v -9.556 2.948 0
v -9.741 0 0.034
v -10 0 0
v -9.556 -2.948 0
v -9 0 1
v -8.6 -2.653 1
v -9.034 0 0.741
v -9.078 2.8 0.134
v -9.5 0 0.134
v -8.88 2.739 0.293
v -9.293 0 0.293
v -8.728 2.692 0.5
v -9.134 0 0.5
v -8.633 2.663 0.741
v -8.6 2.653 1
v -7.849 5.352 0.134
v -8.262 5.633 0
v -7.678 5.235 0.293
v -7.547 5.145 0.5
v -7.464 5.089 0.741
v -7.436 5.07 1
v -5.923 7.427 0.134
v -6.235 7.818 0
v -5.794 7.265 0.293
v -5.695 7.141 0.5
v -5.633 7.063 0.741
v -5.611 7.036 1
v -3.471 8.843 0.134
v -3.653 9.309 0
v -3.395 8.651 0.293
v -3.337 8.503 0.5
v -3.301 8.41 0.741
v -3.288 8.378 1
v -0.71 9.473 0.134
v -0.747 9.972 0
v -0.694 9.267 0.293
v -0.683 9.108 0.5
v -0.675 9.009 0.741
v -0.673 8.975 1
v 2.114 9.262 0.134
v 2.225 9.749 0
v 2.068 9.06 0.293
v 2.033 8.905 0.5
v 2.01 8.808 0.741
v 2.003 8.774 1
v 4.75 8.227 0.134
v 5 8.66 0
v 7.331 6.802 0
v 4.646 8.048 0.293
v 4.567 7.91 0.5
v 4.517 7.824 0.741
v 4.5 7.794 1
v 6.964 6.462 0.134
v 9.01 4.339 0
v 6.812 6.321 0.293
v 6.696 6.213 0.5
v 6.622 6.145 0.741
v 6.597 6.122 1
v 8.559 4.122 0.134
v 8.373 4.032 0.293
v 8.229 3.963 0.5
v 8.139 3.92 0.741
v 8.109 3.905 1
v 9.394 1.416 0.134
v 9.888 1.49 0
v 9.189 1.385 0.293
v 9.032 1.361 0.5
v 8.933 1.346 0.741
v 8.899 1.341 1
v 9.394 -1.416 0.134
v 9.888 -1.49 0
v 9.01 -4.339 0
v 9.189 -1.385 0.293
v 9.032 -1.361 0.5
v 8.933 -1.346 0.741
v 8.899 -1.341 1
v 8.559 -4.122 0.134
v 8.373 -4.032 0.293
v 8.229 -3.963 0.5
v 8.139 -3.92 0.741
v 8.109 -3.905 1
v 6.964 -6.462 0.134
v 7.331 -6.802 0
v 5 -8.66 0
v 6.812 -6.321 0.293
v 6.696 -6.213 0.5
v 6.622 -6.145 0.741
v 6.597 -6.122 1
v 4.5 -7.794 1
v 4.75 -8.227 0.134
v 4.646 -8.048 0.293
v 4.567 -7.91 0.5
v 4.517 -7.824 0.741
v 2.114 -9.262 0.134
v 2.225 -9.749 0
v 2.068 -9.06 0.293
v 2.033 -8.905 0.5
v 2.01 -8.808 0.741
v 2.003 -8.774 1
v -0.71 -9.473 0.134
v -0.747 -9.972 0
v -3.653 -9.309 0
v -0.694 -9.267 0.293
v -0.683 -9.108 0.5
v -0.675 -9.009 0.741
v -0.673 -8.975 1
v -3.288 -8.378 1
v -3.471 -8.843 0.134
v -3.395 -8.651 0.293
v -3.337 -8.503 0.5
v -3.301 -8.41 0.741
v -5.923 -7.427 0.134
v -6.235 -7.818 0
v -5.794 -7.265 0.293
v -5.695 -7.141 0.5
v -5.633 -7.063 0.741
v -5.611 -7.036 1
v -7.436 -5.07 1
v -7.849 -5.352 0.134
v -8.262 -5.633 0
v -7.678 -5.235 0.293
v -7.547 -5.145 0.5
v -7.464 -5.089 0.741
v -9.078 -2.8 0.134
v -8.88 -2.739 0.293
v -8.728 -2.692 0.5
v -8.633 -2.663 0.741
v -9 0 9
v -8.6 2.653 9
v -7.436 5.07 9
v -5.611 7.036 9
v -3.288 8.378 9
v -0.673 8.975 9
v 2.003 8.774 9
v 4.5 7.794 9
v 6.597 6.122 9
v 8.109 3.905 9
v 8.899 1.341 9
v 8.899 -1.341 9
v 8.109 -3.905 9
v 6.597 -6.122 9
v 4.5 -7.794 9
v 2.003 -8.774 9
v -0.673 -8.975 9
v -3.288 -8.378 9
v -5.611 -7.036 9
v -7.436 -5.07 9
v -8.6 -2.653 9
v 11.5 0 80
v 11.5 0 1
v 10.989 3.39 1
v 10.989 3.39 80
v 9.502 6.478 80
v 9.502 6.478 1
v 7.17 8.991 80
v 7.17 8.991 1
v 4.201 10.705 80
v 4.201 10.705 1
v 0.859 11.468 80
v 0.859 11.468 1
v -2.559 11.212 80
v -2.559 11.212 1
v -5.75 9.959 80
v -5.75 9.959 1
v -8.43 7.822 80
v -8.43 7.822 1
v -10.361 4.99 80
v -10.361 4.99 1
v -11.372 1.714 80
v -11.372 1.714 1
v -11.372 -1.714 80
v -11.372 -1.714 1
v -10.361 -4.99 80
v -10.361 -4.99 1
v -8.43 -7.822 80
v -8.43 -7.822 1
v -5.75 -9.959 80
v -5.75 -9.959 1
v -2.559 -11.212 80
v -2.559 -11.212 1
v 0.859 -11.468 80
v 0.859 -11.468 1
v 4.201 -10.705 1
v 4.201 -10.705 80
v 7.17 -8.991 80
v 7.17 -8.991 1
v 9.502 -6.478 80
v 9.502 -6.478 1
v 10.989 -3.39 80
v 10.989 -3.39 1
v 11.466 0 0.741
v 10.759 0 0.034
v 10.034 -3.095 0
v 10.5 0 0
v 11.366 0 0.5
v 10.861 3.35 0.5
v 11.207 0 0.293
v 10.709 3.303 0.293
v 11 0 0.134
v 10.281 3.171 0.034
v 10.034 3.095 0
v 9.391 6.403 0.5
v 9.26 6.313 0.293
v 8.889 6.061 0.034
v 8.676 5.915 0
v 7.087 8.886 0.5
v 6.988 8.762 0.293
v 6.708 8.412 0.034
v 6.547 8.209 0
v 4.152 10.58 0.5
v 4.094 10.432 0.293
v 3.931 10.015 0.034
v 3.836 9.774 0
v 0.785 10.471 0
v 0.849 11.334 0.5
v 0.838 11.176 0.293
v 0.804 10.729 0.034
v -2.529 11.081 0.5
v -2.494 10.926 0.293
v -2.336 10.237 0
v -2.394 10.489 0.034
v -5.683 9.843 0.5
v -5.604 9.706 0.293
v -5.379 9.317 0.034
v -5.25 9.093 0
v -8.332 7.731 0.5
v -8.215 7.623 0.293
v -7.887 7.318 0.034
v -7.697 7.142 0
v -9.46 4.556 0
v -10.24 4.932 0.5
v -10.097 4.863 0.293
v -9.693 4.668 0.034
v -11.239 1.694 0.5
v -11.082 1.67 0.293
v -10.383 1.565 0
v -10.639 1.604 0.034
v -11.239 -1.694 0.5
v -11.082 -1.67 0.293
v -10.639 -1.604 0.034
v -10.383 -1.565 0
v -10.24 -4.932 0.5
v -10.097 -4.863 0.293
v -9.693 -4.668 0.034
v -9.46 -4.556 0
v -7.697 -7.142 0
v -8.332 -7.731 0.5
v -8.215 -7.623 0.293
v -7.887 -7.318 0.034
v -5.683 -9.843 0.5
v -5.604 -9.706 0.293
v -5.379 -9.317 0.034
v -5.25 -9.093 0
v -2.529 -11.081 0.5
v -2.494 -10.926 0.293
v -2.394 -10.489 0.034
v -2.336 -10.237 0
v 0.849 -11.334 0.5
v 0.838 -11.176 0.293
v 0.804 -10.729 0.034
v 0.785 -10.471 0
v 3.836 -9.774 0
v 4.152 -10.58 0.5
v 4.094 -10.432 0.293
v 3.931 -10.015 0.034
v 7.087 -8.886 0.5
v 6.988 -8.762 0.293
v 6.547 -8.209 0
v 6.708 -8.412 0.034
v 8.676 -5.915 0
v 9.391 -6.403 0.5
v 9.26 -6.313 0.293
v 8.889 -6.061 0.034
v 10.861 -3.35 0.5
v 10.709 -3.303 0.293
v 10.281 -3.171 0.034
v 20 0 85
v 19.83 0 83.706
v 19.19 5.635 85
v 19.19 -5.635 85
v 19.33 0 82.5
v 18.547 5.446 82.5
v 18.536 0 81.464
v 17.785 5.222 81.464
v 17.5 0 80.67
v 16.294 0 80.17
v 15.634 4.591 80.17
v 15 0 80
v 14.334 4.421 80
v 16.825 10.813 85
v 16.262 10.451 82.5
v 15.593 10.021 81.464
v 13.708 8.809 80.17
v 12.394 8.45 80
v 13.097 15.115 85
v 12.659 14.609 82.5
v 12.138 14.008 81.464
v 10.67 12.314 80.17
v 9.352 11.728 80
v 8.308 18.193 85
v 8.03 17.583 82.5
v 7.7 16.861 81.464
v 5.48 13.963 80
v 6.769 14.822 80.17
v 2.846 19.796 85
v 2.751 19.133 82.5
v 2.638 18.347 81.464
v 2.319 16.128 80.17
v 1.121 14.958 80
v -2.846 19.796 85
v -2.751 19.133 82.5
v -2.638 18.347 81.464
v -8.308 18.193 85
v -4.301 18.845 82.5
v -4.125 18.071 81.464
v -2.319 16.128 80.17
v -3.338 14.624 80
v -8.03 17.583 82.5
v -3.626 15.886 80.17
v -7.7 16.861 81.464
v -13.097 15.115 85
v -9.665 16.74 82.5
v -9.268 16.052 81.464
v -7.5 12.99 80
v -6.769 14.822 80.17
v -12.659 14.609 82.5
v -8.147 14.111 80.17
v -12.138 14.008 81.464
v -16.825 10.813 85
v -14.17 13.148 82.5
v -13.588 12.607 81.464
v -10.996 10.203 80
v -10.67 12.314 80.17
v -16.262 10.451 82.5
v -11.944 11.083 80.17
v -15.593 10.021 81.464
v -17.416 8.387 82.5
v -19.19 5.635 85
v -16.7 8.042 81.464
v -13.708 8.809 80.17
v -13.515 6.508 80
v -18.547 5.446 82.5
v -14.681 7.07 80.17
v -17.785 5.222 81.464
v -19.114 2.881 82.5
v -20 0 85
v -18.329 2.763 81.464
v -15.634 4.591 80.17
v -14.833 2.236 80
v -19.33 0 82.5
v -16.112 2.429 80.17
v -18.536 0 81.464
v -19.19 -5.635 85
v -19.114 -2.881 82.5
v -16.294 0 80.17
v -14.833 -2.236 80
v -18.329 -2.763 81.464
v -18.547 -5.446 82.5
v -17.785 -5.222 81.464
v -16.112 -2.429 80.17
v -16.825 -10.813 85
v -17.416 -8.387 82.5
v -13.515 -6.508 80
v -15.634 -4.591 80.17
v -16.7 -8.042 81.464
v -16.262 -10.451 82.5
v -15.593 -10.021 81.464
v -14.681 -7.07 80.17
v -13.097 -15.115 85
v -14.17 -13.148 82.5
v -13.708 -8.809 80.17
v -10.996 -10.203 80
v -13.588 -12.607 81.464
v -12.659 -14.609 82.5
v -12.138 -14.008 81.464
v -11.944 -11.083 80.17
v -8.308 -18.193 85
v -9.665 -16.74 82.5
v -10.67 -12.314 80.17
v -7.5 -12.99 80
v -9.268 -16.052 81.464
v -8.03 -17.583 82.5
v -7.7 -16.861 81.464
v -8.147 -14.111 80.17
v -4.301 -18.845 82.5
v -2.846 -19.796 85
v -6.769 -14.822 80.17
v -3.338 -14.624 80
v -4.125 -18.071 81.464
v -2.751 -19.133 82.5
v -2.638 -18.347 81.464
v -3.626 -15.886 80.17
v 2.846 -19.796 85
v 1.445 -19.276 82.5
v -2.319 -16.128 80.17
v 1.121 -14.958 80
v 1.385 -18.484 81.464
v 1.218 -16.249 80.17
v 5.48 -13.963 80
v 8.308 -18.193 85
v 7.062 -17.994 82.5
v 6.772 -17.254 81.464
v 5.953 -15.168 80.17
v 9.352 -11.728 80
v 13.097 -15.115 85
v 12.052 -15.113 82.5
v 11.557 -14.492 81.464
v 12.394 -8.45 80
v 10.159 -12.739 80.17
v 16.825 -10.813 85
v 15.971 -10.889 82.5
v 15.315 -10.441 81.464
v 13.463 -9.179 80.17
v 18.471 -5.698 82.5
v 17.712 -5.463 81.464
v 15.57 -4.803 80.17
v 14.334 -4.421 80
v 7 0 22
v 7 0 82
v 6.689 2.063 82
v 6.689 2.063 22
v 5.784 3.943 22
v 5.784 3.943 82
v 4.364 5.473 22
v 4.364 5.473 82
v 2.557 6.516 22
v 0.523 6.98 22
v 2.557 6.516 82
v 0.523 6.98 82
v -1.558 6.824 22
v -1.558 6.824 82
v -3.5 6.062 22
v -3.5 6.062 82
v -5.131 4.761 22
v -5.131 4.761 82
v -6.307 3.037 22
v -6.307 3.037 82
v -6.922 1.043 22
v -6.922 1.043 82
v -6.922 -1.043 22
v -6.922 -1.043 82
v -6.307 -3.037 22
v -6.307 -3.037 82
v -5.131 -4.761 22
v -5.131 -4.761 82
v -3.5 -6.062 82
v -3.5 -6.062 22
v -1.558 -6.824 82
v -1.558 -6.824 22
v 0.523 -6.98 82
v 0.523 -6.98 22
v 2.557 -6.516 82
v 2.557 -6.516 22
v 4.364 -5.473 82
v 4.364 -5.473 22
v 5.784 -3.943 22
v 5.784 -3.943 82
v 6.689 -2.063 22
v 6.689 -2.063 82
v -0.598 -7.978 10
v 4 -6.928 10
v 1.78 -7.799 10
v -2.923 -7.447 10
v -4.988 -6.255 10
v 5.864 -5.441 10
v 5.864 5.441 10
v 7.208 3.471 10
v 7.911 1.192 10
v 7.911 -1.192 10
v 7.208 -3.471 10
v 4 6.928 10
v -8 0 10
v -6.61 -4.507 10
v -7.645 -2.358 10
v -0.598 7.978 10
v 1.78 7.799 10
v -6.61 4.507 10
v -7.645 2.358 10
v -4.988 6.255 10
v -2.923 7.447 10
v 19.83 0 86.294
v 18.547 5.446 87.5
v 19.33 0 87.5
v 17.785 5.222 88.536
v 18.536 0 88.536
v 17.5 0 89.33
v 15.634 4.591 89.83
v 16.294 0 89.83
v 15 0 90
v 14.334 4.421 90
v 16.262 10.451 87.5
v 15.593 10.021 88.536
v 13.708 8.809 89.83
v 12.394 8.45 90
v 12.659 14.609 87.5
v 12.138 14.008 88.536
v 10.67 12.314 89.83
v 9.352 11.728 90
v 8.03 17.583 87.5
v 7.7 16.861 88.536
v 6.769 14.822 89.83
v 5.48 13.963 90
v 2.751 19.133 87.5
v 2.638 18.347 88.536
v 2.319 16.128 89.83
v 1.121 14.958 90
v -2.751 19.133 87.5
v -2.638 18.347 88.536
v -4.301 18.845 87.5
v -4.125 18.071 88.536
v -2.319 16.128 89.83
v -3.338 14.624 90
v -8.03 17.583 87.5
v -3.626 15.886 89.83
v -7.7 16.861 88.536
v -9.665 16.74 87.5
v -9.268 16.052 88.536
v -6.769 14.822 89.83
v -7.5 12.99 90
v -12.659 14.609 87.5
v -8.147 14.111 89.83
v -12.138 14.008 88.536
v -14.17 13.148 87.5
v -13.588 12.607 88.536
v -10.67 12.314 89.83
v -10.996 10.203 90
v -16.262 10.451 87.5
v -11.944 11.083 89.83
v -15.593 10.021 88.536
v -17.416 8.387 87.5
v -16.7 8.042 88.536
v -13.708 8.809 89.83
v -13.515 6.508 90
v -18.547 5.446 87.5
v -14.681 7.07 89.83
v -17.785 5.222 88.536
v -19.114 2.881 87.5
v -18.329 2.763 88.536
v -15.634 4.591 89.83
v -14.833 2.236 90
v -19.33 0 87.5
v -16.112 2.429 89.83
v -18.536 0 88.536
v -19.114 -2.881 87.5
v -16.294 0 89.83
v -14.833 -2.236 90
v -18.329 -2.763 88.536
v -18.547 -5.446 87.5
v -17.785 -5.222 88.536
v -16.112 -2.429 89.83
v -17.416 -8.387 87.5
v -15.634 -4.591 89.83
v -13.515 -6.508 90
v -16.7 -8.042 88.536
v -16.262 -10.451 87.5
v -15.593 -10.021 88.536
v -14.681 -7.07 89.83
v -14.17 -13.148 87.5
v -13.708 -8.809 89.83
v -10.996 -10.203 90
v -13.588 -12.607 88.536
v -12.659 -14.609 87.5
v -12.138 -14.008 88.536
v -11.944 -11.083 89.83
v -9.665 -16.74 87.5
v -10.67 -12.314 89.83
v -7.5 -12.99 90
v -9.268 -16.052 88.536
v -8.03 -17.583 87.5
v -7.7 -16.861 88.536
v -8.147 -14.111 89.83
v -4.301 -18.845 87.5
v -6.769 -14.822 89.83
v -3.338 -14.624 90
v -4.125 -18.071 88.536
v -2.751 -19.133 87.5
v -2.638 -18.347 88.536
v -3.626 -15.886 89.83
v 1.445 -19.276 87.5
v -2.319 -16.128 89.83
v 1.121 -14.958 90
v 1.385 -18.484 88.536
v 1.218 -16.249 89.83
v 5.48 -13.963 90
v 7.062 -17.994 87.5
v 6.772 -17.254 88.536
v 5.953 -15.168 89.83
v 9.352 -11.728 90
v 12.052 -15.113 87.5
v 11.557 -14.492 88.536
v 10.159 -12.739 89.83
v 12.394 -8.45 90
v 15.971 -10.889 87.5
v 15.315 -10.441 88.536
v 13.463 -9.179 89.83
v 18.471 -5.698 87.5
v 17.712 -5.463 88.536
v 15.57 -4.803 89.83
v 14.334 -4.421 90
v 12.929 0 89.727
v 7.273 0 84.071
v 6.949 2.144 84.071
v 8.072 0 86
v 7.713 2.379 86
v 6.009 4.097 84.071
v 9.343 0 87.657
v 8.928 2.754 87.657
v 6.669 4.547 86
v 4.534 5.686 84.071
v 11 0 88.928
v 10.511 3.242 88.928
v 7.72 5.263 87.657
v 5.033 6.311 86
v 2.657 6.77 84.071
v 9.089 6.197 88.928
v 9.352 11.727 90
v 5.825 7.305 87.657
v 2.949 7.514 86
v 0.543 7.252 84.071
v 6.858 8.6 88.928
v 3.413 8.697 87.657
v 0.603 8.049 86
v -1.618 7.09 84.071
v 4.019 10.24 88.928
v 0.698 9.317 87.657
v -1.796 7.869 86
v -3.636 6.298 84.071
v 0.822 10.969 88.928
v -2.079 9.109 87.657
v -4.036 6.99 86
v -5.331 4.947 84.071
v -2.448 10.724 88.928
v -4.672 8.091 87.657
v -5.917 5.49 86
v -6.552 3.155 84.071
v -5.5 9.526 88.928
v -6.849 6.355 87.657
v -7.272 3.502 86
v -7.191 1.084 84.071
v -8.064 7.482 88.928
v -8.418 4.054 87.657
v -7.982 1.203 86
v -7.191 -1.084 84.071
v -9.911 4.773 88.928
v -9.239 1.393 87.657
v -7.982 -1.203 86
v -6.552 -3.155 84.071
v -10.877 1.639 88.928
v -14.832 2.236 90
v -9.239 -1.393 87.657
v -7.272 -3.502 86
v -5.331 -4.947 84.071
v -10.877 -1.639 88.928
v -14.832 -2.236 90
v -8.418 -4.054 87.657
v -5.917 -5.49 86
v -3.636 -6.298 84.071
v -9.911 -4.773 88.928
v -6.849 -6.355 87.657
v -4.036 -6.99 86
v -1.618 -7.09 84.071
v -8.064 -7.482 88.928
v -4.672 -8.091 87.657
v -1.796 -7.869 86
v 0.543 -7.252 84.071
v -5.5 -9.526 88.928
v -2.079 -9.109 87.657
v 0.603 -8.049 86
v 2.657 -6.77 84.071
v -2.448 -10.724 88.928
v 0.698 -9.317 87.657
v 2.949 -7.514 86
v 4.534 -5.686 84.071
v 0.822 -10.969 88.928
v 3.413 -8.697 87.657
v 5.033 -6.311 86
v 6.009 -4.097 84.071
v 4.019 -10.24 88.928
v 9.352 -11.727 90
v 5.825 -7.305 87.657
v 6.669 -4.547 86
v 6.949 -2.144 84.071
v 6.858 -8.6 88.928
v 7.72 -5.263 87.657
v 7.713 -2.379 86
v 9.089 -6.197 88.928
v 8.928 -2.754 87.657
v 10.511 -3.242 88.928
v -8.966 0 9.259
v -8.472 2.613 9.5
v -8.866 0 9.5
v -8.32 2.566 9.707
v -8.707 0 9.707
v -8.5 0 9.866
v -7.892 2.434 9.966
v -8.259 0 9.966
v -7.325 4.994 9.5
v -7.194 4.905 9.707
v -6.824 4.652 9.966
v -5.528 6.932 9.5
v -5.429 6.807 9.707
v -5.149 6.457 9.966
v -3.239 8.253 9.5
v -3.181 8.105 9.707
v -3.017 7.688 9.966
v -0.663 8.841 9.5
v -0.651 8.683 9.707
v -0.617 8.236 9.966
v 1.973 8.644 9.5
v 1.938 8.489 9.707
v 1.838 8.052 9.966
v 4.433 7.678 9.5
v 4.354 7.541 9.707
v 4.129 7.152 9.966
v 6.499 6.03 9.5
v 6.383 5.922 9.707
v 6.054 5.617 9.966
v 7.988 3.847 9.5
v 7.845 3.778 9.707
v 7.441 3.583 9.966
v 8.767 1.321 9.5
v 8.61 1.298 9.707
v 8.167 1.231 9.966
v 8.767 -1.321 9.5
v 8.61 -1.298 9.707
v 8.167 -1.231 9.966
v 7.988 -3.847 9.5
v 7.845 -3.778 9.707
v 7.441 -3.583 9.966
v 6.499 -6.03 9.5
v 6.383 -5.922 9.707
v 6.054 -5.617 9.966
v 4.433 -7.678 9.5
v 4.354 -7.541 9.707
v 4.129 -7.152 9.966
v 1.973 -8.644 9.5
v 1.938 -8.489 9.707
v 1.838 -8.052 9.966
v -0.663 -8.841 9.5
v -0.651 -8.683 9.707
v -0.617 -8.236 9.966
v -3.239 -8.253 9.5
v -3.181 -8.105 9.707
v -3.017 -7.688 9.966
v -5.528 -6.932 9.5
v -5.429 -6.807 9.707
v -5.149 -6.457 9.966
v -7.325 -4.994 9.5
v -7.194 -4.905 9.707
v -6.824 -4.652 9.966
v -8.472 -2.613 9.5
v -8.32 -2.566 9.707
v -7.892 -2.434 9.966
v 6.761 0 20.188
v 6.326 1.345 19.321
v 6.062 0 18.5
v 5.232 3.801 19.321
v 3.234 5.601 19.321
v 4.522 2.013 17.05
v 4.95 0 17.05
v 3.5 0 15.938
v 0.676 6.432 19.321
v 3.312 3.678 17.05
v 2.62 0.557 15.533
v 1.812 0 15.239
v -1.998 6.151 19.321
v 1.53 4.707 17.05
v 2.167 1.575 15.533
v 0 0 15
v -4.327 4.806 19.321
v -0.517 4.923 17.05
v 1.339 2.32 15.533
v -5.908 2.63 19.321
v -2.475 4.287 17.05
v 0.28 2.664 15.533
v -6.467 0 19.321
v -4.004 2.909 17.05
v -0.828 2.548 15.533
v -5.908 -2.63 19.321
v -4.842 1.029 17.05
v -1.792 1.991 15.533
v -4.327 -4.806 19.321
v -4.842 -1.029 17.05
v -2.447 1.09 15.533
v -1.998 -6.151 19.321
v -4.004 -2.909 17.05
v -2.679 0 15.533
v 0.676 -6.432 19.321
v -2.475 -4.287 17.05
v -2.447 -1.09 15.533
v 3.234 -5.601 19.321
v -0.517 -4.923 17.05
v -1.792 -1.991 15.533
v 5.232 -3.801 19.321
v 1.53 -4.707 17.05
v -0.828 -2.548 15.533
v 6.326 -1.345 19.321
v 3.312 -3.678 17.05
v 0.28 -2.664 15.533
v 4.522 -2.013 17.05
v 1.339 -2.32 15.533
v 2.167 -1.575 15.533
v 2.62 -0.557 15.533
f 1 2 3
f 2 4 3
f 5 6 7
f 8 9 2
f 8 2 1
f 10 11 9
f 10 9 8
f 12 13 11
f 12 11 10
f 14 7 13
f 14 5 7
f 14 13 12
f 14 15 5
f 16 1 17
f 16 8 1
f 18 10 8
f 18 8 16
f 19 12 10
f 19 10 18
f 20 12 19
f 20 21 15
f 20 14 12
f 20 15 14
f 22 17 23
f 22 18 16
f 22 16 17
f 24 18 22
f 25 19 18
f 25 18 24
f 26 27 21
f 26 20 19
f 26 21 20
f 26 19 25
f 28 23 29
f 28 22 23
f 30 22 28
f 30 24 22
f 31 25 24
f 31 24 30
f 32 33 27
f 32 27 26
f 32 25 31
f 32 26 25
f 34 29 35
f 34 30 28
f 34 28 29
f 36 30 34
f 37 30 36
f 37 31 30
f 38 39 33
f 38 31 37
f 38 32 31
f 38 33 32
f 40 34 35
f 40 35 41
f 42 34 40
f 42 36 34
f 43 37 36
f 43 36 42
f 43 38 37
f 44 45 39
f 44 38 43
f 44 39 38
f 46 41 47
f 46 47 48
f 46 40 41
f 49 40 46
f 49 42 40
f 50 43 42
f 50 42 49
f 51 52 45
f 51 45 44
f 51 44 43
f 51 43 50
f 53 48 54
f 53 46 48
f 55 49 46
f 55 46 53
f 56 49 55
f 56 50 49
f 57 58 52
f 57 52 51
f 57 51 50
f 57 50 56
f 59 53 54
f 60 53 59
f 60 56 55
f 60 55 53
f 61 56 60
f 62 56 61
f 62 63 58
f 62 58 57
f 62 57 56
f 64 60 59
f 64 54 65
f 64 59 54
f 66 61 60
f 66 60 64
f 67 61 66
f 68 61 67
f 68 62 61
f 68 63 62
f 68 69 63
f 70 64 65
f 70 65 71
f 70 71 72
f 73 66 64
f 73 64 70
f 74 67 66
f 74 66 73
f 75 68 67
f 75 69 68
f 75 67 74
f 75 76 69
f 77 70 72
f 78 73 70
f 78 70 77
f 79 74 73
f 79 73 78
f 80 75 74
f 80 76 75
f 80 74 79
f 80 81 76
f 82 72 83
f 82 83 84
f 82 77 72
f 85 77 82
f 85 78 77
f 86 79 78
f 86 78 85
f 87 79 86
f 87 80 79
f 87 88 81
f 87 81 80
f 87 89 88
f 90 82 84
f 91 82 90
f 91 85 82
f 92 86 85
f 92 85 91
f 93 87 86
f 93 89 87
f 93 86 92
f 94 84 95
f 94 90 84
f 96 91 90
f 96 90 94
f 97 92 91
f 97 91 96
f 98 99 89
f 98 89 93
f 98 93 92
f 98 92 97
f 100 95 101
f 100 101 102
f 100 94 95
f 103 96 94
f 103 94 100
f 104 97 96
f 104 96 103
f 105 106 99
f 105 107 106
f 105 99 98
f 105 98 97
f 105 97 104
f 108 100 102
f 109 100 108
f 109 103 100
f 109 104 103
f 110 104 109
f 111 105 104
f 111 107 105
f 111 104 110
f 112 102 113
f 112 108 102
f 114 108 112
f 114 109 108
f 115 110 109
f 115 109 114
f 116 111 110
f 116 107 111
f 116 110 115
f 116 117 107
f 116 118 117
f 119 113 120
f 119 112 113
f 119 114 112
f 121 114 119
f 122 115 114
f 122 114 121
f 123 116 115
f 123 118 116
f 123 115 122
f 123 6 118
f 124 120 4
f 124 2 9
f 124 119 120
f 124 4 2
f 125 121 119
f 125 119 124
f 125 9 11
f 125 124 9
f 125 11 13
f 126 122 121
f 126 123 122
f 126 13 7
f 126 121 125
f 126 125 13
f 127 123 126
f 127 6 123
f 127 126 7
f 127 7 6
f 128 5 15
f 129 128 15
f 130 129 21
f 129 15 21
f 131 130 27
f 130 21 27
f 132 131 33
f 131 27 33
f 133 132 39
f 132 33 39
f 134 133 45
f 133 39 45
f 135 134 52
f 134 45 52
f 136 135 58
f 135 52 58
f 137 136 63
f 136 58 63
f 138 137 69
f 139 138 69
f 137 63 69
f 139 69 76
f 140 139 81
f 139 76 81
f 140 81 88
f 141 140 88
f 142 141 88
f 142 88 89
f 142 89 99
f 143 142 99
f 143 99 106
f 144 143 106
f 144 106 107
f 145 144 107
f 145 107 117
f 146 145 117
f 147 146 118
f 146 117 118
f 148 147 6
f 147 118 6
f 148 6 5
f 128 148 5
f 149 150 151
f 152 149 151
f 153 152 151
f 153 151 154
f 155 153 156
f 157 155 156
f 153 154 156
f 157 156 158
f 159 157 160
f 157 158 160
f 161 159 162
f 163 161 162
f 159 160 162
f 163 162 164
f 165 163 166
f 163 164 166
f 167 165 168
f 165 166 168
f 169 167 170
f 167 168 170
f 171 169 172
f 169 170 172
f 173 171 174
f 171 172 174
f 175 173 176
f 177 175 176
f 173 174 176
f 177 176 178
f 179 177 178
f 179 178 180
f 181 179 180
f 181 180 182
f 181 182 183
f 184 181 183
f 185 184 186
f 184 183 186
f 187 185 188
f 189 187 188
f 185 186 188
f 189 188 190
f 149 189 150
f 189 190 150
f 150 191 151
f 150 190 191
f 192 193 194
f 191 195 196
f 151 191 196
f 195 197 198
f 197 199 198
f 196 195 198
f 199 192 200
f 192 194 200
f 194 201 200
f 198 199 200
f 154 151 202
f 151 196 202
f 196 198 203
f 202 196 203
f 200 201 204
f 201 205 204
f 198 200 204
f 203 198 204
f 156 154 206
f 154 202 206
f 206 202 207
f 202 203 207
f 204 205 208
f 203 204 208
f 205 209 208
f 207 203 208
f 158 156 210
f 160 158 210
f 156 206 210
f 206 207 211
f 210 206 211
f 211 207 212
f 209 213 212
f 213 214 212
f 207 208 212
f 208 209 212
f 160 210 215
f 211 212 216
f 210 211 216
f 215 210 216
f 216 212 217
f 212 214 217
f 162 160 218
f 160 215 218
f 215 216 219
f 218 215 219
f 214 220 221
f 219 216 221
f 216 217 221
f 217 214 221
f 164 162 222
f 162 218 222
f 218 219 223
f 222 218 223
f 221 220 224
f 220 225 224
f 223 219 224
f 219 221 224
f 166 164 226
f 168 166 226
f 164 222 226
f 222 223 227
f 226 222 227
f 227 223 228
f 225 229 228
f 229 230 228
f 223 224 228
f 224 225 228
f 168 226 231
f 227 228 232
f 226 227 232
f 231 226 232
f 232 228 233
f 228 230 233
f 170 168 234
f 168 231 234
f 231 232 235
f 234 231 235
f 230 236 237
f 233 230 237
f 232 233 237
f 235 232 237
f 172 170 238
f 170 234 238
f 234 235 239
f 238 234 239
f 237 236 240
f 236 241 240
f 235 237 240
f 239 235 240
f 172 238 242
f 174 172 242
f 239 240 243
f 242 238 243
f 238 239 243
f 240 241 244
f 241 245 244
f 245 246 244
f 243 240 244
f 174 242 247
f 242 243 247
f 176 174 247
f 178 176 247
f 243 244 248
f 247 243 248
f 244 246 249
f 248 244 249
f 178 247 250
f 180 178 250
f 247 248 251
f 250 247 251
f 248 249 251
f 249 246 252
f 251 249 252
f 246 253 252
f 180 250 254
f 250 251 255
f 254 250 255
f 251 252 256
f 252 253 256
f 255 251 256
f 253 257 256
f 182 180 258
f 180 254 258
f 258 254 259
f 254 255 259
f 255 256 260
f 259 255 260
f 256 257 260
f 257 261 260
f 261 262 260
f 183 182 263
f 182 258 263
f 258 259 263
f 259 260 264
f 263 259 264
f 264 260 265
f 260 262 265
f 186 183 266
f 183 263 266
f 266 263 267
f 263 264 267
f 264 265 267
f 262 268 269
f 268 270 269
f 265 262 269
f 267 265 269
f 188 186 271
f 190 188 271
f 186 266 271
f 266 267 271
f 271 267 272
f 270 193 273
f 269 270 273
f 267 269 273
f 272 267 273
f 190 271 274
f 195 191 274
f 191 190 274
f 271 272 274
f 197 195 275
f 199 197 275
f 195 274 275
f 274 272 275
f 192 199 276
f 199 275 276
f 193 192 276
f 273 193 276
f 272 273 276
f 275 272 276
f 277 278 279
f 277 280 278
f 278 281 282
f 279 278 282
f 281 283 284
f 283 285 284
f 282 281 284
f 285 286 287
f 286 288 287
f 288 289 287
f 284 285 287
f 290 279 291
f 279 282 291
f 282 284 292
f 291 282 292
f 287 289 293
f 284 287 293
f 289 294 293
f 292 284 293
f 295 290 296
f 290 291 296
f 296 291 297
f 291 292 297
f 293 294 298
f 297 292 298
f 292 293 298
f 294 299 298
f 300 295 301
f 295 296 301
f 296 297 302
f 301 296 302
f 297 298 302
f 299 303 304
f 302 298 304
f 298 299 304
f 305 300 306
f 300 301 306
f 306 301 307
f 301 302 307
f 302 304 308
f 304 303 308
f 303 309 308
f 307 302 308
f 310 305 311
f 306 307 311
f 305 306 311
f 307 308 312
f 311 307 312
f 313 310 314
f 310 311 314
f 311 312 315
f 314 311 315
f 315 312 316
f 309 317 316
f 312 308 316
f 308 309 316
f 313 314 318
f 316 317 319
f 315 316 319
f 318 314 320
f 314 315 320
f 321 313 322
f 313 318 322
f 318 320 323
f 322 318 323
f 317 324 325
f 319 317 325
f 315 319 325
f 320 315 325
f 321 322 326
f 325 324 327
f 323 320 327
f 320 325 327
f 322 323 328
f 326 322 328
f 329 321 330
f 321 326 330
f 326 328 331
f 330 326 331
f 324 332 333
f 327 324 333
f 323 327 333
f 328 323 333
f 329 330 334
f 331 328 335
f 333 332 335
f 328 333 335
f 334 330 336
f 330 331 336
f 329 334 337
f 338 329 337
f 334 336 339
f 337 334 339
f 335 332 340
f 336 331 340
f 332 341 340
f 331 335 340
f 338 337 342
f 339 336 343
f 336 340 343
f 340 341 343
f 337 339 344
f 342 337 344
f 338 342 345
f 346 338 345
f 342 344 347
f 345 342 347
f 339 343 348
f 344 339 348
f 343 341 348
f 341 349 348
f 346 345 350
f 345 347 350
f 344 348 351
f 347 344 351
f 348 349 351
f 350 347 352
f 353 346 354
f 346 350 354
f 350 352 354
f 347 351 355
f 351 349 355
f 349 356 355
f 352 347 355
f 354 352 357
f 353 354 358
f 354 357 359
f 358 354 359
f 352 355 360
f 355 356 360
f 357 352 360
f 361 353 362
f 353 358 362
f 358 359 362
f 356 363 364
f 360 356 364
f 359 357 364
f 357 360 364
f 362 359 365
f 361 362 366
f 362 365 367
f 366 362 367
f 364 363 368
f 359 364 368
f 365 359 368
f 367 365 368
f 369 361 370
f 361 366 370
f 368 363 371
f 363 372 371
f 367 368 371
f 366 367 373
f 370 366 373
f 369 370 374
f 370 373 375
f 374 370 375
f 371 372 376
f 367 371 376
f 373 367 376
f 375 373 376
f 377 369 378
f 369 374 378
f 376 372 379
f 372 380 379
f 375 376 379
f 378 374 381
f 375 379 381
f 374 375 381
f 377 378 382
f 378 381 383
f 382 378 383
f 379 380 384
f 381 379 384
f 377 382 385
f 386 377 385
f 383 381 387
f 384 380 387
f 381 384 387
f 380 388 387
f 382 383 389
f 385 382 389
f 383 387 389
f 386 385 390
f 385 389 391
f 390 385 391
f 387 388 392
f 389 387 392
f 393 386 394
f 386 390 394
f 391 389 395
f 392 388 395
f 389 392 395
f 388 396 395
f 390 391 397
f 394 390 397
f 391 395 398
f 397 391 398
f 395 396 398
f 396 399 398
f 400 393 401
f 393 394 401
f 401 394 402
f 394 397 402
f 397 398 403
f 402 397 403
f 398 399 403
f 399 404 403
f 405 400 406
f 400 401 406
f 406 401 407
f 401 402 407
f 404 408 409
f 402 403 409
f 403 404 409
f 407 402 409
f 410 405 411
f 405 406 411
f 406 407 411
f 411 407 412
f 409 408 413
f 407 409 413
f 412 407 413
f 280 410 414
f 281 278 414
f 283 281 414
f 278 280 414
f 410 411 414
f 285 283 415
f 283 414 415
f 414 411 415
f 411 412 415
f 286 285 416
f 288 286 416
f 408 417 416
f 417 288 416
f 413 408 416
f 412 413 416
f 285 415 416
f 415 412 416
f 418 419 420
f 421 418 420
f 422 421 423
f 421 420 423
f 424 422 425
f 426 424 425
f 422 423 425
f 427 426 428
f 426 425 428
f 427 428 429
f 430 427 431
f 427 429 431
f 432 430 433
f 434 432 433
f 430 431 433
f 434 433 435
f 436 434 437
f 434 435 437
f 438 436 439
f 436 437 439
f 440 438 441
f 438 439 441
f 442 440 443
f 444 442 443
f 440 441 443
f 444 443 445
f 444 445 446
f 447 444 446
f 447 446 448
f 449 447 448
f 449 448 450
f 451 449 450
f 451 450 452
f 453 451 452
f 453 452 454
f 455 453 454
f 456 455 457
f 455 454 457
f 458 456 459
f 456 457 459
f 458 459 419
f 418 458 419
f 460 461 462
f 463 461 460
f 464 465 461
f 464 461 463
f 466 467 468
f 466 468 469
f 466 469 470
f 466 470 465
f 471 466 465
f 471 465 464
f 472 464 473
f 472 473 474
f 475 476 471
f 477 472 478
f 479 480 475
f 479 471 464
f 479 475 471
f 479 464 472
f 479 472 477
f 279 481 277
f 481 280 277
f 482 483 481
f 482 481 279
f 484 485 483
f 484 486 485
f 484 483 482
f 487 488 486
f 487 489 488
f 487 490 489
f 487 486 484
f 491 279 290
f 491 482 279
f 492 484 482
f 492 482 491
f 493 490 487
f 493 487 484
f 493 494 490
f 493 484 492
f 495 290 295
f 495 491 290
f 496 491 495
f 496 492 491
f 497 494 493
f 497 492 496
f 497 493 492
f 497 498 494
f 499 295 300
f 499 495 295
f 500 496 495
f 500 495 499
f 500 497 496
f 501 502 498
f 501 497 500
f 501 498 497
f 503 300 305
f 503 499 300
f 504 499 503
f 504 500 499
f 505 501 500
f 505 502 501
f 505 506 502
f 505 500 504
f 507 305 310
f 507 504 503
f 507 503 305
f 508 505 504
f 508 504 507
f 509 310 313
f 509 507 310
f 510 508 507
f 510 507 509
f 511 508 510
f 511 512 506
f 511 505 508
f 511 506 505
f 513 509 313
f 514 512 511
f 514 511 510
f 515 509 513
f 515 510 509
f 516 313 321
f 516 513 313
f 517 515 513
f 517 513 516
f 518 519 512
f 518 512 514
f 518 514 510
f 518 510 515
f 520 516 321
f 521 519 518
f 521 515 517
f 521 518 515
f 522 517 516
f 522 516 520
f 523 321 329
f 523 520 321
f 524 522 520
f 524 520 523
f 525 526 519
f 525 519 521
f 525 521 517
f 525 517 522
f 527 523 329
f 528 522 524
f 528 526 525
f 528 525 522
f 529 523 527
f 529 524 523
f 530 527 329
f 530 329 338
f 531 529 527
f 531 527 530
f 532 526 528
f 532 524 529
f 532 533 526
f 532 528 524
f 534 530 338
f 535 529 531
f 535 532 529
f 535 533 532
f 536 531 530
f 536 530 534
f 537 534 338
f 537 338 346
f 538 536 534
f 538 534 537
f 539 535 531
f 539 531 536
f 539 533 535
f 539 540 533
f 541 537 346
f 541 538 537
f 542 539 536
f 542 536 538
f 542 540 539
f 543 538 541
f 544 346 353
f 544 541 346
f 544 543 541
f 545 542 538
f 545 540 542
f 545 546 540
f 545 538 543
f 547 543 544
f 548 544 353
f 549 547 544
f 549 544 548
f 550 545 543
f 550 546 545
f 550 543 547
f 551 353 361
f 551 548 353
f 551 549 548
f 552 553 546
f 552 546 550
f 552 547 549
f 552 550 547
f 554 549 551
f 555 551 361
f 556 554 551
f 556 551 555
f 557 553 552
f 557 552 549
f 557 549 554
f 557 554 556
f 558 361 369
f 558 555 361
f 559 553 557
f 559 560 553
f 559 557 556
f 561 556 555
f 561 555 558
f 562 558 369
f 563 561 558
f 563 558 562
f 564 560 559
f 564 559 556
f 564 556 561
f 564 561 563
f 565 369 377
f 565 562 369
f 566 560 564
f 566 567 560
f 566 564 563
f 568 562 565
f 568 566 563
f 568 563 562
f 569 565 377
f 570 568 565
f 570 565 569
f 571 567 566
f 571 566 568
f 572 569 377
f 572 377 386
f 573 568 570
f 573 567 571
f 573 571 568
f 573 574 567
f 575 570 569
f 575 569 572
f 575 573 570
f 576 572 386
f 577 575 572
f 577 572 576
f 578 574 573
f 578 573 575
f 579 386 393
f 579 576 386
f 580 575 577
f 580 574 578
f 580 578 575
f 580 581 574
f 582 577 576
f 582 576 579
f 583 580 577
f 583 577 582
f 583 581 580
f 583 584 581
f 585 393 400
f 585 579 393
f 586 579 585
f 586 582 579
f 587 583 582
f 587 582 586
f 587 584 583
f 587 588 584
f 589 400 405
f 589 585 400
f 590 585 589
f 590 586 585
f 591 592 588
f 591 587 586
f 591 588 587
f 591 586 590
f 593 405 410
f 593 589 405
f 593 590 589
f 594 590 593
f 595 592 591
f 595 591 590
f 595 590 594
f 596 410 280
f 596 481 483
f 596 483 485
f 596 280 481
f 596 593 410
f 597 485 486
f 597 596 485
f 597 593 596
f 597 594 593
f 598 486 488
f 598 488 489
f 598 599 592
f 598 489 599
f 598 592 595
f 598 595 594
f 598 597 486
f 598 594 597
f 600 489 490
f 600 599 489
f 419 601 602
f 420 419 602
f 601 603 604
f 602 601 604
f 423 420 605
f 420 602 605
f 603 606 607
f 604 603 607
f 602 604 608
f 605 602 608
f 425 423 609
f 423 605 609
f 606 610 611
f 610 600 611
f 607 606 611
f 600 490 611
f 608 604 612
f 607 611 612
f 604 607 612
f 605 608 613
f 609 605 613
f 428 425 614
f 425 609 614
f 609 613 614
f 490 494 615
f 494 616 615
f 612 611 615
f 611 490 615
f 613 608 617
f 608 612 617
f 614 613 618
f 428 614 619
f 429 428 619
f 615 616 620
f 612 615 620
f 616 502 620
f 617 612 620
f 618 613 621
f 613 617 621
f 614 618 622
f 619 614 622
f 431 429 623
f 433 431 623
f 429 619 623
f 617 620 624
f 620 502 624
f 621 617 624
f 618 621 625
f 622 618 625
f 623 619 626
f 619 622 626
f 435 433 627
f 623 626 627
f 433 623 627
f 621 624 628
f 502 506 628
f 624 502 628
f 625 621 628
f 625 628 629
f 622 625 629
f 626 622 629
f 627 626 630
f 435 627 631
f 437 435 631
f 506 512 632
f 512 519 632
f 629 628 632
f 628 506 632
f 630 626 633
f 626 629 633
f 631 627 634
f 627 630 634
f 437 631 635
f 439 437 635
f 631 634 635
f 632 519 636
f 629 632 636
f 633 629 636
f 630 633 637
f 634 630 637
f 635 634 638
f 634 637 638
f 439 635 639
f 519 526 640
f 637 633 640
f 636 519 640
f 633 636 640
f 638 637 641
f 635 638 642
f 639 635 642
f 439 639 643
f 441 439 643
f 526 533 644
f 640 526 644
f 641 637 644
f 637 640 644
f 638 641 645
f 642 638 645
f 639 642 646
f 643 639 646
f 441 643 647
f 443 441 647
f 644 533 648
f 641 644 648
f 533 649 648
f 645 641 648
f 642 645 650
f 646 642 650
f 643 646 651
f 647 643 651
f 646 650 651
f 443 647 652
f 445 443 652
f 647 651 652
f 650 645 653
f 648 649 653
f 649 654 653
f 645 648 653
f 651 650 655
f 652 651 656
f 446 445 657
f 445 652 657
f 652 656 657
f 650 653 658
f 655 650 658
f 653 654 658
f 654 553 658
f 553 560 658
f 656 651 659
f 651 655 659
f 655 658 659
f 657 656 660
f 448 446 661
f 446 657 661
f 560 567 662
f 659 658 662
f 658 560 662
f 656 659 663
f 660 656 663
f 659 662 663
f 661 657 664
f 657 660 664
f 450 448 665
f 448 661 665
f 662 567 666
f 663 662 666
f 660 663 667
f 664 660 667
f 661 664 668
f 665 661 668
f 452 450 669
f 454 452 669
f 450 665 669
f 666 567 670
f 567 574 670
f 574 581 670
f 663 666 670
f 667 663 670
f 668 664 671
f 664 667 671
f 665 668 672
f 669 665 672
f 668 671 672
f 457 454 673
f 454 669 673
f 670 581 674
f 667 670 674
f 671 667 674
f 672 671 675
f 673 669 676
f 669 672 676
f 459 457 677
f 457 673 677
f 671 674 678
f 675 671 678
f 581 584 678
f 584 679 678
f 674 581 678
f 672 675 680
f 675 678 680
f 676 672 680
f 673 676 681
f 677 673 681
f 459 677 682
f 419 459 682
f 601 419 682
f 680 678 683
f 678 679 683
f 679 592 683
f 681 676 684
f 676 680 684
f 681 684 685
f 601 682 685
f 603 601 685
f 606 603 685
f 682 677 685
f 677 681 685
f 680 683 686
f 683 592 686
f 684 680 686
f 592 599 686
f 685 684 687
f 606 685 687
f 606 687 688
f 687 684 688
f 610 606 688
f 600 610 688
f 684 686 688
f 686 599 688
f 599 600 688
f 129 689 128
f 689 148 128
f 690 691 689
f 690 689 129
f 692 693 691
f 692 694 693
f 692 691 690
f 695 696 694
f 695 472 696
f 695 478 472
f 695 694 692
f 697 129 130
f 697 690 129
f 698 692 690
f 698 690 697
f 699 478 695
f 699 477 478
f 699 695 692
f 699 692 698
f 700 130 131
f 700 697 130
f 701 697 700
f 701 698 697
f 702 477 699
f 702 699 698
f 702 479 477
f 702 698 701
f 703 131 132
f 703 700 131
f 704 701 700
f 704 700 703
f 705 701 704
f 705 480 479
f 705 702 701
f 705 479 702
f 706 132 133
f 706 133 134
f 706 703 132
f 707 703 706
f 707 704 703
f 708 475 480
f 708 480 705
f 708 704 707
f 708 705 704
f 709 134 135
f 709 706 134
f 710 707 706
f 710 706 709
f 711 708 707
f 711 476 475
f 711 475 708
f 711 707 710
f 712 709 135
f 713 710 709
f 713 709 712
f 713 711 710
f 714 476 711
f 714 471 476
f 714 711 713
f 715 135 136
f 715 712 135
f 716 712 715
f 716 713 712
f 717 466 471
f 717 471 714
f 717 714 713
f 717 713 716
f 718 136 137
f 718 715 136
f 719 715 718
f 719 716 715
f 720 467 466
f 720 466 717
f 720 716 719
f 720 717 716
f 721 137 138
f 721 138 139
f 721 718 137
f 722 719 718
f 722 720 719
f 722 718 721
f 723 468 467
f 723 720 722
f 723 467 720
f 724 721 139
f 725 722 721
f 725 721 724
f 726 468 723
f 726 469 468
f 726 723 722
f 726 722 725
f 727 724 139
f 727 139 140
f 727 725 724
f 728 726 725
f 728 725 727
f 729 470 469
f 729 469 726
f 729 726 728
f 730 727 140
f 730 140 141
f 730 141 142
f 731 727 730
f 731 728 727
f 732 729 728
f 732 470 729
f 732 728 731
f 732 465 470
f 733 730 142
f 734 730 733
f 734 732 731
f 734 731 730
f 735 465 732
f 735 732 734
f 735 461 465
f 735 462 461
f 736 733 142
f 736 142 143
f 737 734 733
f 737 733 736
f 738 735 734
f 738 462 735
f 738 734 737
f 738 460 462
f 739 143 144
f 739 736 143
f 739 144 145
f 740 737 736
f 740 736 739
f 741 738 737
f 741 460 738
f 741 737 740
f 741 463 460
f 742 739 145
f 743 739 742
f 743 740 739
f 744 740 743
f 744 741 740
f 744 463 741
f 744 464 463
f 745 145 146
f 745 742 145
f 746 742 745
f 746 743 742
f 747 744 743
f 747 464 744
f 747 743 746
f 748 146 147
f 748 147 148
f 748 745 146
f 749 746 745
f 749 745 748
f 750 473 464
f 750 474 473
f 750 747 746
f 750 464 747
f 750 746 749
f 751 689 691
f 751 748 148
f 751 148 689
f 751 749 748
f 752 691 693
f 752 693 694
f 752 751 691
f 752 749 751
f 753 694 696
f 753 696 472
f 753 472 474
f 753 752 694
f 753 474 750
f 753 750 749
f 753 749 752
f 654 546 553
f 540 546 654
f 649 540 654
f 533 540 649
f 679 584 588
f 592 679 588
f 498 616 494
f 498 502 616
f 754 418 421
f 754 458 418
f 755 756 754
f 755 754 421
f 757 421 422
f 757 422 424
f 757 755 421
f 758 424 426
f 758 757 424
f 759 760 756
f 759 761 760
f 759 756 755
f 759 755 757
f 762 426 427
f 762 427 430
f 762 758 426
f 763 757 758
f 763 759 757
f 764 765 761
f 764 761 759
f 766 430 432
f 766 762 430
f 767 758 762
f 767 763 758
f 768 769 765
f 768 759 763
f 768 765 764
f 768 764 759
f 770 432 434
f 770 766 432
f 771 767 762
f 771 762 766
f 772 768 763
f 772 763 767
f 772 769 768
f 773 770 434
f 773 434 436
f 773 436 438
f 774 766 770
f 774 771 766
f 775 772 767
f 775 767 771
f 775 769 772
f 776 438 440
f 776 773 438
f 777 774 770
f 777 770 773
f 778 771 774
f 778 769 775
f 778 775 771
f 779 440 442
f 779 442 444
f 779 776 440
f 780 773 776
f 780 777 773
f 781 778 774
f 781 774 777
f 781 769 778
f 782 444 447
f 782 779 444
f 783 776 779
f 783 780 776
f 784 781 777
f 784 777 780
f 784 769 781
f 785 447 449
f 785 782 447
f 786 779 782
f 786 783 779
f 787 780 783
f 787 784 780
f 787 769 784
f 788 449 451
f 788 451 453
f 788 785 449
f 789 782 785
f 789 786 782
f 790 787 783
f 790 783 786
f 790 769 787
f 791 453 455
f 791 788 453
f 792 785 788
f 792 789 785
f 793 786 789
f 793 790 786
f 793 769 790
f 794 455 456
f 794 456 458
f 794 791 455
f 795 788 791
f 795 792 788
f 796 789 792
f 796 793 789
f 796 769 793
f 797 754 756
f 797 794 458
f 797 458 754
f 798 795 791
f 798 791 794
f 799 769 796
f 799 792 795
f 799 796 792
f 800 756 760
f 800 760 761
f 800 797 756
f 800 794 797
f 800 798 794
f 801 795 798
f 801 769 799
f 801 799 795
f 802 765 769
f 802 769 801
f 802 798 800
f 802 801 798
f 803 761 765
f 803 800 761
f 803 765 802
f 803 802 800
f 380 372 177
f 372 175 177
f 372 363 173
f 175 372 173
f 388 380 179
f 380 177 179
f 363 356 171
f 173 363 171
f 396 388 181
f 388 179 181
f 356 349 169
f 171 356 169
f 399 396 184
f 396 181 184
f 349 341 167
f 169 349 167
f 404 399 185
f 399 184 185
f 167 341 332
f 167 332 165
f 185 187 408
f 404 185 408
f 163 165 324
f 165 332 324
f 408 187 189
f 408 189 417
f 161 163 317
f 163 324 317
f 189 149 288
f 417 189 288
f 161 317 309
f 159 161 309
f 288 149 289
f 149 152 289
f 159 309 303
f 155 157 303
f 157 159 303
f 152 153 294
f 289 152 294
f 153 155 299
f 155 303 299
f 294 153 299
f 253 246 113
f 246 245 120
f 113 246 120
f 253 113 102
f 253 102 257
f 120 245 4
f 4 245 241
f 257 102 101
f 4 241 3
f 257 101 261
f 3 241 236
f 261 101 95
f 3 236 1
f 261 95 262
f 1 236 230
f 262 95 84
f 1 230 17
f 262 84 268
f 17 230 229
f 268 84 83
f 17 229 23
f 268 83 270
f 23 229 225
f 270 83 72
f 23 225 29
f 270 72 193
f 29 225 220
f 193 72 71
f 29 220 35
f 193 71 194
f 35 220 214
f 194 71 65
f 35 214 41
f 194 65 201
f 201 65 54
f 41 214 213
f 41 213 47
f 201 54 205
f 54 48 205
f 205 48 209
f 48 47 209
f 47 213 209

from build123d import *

# Parameters (mm, degrees)
SKIZZE1_R                       = 11.5
AUFSATZ_LINEAR_AUSTRAGEN3_DEPTH = 80
SKIZZE4_R                       = 9
SCHNITT_LINEAR_AUSTRAGEN2_DEPTH = 10
VERRUNDUNG1_R                   = 1
VERRUNDUNG2_R                   = 1
SKIZZE5_R                       = 20
AUFSATZ_LINEAR_AUSTRAGEN4_DEPTH = 10
VERRUNDUNG3_R                   = 5
SKIZZE6_R                       = 7
SCHNITT_LINEAR_AUSTRAGEN3_DEPTH = 75
VERRUNDUNG4_R                   = 7
VERRUNDUNG5_R                   = 8


with BuildPart() as part:
    # Skizze1 → Aufsatz-Linear austragen3 (new body)
    with BuildSketch(Plane.XY):
        Circle(SKIZZE1_R)
    extrude(amount=AUFSATZ_LINEAR_AUSTRAGEN3_DEPTH)

    # Skizze4 → Schnitt-Linear austragen2 (cut)
    with BuildSketch(Plane(origin=(0, 0, 0), x_dir=(-1, 0, 0), z_dir=(0, 0, -1))):
        Circle(SKIZZE4_R)
    extrude(amount=-SCHNITT_LINEAR_AUSTRAGEN2_DEPTH, mode=Mode.SUBTRACT)

    # Verrundung1
    verrundung1_edges = [part.edges().sort_by_distance(p)[0] for p in [
        (-11.5, 0, 0),
        (9, 0, 0),
    ]]
    fillet(verrundung1_edges, radius=VERRUNDUNG1_R)

    # Verrundung2
    verrundung2_edges = [part.edges().sort_by_distance(p)[0] for p in [
        (9, 0, 10),
    ]]
    fillet(verrundung2_edges, radius=VERRUNDUNG2_R)

    # Skizze5 → Aufsatz-Linear austragen4 (add)
    with BuildSketch(Plane.XY.offset(80)):
        Circle(SKIZZE5_R)
    extrude(amount=AUFSATZ_LINEAR_AUSTRAGEN4_DEPTH)

    # Verrundung3
    verrundung3_edges = [part.edges().sort_by_distance(p)[0] for p in [
        (-20, 0, 80),
        (-20, 0, 90),
    ]]
    fillet(verrundung3_edges, radius=VERRUNDUNG3_R - 0.0001)  # a hair under: the kernel refuses the full size

    # Skizze6 → Schnitt-Linear austragen3 (cut)
    with BuildSketch(Plane.XY.offset(90)):
        Circle(SKIZZE6_R)
    extrude(amount=-SCHNITT_LINEAR_AUSTRAGEN3_DEPTH, mode=Mode.SUBTRACT)

    # Verrundung4
    verrundung4_edges = [part.edges().sort_by_distance(p)[0] for p in [
        (-7, 0, 15),
    ]]
    fillet(verrundung4_edges, radius=VERRUNDUNG4_R)

    # Verrundung5
    verrundung5_edges = [part.edges().sort_by_distance(p)[0] for p in [
        (-7, 0, 90),
    ]]
    fillet(verrundung5_edges, radius=VERRUNDUNG5_R)


solid = part.part
